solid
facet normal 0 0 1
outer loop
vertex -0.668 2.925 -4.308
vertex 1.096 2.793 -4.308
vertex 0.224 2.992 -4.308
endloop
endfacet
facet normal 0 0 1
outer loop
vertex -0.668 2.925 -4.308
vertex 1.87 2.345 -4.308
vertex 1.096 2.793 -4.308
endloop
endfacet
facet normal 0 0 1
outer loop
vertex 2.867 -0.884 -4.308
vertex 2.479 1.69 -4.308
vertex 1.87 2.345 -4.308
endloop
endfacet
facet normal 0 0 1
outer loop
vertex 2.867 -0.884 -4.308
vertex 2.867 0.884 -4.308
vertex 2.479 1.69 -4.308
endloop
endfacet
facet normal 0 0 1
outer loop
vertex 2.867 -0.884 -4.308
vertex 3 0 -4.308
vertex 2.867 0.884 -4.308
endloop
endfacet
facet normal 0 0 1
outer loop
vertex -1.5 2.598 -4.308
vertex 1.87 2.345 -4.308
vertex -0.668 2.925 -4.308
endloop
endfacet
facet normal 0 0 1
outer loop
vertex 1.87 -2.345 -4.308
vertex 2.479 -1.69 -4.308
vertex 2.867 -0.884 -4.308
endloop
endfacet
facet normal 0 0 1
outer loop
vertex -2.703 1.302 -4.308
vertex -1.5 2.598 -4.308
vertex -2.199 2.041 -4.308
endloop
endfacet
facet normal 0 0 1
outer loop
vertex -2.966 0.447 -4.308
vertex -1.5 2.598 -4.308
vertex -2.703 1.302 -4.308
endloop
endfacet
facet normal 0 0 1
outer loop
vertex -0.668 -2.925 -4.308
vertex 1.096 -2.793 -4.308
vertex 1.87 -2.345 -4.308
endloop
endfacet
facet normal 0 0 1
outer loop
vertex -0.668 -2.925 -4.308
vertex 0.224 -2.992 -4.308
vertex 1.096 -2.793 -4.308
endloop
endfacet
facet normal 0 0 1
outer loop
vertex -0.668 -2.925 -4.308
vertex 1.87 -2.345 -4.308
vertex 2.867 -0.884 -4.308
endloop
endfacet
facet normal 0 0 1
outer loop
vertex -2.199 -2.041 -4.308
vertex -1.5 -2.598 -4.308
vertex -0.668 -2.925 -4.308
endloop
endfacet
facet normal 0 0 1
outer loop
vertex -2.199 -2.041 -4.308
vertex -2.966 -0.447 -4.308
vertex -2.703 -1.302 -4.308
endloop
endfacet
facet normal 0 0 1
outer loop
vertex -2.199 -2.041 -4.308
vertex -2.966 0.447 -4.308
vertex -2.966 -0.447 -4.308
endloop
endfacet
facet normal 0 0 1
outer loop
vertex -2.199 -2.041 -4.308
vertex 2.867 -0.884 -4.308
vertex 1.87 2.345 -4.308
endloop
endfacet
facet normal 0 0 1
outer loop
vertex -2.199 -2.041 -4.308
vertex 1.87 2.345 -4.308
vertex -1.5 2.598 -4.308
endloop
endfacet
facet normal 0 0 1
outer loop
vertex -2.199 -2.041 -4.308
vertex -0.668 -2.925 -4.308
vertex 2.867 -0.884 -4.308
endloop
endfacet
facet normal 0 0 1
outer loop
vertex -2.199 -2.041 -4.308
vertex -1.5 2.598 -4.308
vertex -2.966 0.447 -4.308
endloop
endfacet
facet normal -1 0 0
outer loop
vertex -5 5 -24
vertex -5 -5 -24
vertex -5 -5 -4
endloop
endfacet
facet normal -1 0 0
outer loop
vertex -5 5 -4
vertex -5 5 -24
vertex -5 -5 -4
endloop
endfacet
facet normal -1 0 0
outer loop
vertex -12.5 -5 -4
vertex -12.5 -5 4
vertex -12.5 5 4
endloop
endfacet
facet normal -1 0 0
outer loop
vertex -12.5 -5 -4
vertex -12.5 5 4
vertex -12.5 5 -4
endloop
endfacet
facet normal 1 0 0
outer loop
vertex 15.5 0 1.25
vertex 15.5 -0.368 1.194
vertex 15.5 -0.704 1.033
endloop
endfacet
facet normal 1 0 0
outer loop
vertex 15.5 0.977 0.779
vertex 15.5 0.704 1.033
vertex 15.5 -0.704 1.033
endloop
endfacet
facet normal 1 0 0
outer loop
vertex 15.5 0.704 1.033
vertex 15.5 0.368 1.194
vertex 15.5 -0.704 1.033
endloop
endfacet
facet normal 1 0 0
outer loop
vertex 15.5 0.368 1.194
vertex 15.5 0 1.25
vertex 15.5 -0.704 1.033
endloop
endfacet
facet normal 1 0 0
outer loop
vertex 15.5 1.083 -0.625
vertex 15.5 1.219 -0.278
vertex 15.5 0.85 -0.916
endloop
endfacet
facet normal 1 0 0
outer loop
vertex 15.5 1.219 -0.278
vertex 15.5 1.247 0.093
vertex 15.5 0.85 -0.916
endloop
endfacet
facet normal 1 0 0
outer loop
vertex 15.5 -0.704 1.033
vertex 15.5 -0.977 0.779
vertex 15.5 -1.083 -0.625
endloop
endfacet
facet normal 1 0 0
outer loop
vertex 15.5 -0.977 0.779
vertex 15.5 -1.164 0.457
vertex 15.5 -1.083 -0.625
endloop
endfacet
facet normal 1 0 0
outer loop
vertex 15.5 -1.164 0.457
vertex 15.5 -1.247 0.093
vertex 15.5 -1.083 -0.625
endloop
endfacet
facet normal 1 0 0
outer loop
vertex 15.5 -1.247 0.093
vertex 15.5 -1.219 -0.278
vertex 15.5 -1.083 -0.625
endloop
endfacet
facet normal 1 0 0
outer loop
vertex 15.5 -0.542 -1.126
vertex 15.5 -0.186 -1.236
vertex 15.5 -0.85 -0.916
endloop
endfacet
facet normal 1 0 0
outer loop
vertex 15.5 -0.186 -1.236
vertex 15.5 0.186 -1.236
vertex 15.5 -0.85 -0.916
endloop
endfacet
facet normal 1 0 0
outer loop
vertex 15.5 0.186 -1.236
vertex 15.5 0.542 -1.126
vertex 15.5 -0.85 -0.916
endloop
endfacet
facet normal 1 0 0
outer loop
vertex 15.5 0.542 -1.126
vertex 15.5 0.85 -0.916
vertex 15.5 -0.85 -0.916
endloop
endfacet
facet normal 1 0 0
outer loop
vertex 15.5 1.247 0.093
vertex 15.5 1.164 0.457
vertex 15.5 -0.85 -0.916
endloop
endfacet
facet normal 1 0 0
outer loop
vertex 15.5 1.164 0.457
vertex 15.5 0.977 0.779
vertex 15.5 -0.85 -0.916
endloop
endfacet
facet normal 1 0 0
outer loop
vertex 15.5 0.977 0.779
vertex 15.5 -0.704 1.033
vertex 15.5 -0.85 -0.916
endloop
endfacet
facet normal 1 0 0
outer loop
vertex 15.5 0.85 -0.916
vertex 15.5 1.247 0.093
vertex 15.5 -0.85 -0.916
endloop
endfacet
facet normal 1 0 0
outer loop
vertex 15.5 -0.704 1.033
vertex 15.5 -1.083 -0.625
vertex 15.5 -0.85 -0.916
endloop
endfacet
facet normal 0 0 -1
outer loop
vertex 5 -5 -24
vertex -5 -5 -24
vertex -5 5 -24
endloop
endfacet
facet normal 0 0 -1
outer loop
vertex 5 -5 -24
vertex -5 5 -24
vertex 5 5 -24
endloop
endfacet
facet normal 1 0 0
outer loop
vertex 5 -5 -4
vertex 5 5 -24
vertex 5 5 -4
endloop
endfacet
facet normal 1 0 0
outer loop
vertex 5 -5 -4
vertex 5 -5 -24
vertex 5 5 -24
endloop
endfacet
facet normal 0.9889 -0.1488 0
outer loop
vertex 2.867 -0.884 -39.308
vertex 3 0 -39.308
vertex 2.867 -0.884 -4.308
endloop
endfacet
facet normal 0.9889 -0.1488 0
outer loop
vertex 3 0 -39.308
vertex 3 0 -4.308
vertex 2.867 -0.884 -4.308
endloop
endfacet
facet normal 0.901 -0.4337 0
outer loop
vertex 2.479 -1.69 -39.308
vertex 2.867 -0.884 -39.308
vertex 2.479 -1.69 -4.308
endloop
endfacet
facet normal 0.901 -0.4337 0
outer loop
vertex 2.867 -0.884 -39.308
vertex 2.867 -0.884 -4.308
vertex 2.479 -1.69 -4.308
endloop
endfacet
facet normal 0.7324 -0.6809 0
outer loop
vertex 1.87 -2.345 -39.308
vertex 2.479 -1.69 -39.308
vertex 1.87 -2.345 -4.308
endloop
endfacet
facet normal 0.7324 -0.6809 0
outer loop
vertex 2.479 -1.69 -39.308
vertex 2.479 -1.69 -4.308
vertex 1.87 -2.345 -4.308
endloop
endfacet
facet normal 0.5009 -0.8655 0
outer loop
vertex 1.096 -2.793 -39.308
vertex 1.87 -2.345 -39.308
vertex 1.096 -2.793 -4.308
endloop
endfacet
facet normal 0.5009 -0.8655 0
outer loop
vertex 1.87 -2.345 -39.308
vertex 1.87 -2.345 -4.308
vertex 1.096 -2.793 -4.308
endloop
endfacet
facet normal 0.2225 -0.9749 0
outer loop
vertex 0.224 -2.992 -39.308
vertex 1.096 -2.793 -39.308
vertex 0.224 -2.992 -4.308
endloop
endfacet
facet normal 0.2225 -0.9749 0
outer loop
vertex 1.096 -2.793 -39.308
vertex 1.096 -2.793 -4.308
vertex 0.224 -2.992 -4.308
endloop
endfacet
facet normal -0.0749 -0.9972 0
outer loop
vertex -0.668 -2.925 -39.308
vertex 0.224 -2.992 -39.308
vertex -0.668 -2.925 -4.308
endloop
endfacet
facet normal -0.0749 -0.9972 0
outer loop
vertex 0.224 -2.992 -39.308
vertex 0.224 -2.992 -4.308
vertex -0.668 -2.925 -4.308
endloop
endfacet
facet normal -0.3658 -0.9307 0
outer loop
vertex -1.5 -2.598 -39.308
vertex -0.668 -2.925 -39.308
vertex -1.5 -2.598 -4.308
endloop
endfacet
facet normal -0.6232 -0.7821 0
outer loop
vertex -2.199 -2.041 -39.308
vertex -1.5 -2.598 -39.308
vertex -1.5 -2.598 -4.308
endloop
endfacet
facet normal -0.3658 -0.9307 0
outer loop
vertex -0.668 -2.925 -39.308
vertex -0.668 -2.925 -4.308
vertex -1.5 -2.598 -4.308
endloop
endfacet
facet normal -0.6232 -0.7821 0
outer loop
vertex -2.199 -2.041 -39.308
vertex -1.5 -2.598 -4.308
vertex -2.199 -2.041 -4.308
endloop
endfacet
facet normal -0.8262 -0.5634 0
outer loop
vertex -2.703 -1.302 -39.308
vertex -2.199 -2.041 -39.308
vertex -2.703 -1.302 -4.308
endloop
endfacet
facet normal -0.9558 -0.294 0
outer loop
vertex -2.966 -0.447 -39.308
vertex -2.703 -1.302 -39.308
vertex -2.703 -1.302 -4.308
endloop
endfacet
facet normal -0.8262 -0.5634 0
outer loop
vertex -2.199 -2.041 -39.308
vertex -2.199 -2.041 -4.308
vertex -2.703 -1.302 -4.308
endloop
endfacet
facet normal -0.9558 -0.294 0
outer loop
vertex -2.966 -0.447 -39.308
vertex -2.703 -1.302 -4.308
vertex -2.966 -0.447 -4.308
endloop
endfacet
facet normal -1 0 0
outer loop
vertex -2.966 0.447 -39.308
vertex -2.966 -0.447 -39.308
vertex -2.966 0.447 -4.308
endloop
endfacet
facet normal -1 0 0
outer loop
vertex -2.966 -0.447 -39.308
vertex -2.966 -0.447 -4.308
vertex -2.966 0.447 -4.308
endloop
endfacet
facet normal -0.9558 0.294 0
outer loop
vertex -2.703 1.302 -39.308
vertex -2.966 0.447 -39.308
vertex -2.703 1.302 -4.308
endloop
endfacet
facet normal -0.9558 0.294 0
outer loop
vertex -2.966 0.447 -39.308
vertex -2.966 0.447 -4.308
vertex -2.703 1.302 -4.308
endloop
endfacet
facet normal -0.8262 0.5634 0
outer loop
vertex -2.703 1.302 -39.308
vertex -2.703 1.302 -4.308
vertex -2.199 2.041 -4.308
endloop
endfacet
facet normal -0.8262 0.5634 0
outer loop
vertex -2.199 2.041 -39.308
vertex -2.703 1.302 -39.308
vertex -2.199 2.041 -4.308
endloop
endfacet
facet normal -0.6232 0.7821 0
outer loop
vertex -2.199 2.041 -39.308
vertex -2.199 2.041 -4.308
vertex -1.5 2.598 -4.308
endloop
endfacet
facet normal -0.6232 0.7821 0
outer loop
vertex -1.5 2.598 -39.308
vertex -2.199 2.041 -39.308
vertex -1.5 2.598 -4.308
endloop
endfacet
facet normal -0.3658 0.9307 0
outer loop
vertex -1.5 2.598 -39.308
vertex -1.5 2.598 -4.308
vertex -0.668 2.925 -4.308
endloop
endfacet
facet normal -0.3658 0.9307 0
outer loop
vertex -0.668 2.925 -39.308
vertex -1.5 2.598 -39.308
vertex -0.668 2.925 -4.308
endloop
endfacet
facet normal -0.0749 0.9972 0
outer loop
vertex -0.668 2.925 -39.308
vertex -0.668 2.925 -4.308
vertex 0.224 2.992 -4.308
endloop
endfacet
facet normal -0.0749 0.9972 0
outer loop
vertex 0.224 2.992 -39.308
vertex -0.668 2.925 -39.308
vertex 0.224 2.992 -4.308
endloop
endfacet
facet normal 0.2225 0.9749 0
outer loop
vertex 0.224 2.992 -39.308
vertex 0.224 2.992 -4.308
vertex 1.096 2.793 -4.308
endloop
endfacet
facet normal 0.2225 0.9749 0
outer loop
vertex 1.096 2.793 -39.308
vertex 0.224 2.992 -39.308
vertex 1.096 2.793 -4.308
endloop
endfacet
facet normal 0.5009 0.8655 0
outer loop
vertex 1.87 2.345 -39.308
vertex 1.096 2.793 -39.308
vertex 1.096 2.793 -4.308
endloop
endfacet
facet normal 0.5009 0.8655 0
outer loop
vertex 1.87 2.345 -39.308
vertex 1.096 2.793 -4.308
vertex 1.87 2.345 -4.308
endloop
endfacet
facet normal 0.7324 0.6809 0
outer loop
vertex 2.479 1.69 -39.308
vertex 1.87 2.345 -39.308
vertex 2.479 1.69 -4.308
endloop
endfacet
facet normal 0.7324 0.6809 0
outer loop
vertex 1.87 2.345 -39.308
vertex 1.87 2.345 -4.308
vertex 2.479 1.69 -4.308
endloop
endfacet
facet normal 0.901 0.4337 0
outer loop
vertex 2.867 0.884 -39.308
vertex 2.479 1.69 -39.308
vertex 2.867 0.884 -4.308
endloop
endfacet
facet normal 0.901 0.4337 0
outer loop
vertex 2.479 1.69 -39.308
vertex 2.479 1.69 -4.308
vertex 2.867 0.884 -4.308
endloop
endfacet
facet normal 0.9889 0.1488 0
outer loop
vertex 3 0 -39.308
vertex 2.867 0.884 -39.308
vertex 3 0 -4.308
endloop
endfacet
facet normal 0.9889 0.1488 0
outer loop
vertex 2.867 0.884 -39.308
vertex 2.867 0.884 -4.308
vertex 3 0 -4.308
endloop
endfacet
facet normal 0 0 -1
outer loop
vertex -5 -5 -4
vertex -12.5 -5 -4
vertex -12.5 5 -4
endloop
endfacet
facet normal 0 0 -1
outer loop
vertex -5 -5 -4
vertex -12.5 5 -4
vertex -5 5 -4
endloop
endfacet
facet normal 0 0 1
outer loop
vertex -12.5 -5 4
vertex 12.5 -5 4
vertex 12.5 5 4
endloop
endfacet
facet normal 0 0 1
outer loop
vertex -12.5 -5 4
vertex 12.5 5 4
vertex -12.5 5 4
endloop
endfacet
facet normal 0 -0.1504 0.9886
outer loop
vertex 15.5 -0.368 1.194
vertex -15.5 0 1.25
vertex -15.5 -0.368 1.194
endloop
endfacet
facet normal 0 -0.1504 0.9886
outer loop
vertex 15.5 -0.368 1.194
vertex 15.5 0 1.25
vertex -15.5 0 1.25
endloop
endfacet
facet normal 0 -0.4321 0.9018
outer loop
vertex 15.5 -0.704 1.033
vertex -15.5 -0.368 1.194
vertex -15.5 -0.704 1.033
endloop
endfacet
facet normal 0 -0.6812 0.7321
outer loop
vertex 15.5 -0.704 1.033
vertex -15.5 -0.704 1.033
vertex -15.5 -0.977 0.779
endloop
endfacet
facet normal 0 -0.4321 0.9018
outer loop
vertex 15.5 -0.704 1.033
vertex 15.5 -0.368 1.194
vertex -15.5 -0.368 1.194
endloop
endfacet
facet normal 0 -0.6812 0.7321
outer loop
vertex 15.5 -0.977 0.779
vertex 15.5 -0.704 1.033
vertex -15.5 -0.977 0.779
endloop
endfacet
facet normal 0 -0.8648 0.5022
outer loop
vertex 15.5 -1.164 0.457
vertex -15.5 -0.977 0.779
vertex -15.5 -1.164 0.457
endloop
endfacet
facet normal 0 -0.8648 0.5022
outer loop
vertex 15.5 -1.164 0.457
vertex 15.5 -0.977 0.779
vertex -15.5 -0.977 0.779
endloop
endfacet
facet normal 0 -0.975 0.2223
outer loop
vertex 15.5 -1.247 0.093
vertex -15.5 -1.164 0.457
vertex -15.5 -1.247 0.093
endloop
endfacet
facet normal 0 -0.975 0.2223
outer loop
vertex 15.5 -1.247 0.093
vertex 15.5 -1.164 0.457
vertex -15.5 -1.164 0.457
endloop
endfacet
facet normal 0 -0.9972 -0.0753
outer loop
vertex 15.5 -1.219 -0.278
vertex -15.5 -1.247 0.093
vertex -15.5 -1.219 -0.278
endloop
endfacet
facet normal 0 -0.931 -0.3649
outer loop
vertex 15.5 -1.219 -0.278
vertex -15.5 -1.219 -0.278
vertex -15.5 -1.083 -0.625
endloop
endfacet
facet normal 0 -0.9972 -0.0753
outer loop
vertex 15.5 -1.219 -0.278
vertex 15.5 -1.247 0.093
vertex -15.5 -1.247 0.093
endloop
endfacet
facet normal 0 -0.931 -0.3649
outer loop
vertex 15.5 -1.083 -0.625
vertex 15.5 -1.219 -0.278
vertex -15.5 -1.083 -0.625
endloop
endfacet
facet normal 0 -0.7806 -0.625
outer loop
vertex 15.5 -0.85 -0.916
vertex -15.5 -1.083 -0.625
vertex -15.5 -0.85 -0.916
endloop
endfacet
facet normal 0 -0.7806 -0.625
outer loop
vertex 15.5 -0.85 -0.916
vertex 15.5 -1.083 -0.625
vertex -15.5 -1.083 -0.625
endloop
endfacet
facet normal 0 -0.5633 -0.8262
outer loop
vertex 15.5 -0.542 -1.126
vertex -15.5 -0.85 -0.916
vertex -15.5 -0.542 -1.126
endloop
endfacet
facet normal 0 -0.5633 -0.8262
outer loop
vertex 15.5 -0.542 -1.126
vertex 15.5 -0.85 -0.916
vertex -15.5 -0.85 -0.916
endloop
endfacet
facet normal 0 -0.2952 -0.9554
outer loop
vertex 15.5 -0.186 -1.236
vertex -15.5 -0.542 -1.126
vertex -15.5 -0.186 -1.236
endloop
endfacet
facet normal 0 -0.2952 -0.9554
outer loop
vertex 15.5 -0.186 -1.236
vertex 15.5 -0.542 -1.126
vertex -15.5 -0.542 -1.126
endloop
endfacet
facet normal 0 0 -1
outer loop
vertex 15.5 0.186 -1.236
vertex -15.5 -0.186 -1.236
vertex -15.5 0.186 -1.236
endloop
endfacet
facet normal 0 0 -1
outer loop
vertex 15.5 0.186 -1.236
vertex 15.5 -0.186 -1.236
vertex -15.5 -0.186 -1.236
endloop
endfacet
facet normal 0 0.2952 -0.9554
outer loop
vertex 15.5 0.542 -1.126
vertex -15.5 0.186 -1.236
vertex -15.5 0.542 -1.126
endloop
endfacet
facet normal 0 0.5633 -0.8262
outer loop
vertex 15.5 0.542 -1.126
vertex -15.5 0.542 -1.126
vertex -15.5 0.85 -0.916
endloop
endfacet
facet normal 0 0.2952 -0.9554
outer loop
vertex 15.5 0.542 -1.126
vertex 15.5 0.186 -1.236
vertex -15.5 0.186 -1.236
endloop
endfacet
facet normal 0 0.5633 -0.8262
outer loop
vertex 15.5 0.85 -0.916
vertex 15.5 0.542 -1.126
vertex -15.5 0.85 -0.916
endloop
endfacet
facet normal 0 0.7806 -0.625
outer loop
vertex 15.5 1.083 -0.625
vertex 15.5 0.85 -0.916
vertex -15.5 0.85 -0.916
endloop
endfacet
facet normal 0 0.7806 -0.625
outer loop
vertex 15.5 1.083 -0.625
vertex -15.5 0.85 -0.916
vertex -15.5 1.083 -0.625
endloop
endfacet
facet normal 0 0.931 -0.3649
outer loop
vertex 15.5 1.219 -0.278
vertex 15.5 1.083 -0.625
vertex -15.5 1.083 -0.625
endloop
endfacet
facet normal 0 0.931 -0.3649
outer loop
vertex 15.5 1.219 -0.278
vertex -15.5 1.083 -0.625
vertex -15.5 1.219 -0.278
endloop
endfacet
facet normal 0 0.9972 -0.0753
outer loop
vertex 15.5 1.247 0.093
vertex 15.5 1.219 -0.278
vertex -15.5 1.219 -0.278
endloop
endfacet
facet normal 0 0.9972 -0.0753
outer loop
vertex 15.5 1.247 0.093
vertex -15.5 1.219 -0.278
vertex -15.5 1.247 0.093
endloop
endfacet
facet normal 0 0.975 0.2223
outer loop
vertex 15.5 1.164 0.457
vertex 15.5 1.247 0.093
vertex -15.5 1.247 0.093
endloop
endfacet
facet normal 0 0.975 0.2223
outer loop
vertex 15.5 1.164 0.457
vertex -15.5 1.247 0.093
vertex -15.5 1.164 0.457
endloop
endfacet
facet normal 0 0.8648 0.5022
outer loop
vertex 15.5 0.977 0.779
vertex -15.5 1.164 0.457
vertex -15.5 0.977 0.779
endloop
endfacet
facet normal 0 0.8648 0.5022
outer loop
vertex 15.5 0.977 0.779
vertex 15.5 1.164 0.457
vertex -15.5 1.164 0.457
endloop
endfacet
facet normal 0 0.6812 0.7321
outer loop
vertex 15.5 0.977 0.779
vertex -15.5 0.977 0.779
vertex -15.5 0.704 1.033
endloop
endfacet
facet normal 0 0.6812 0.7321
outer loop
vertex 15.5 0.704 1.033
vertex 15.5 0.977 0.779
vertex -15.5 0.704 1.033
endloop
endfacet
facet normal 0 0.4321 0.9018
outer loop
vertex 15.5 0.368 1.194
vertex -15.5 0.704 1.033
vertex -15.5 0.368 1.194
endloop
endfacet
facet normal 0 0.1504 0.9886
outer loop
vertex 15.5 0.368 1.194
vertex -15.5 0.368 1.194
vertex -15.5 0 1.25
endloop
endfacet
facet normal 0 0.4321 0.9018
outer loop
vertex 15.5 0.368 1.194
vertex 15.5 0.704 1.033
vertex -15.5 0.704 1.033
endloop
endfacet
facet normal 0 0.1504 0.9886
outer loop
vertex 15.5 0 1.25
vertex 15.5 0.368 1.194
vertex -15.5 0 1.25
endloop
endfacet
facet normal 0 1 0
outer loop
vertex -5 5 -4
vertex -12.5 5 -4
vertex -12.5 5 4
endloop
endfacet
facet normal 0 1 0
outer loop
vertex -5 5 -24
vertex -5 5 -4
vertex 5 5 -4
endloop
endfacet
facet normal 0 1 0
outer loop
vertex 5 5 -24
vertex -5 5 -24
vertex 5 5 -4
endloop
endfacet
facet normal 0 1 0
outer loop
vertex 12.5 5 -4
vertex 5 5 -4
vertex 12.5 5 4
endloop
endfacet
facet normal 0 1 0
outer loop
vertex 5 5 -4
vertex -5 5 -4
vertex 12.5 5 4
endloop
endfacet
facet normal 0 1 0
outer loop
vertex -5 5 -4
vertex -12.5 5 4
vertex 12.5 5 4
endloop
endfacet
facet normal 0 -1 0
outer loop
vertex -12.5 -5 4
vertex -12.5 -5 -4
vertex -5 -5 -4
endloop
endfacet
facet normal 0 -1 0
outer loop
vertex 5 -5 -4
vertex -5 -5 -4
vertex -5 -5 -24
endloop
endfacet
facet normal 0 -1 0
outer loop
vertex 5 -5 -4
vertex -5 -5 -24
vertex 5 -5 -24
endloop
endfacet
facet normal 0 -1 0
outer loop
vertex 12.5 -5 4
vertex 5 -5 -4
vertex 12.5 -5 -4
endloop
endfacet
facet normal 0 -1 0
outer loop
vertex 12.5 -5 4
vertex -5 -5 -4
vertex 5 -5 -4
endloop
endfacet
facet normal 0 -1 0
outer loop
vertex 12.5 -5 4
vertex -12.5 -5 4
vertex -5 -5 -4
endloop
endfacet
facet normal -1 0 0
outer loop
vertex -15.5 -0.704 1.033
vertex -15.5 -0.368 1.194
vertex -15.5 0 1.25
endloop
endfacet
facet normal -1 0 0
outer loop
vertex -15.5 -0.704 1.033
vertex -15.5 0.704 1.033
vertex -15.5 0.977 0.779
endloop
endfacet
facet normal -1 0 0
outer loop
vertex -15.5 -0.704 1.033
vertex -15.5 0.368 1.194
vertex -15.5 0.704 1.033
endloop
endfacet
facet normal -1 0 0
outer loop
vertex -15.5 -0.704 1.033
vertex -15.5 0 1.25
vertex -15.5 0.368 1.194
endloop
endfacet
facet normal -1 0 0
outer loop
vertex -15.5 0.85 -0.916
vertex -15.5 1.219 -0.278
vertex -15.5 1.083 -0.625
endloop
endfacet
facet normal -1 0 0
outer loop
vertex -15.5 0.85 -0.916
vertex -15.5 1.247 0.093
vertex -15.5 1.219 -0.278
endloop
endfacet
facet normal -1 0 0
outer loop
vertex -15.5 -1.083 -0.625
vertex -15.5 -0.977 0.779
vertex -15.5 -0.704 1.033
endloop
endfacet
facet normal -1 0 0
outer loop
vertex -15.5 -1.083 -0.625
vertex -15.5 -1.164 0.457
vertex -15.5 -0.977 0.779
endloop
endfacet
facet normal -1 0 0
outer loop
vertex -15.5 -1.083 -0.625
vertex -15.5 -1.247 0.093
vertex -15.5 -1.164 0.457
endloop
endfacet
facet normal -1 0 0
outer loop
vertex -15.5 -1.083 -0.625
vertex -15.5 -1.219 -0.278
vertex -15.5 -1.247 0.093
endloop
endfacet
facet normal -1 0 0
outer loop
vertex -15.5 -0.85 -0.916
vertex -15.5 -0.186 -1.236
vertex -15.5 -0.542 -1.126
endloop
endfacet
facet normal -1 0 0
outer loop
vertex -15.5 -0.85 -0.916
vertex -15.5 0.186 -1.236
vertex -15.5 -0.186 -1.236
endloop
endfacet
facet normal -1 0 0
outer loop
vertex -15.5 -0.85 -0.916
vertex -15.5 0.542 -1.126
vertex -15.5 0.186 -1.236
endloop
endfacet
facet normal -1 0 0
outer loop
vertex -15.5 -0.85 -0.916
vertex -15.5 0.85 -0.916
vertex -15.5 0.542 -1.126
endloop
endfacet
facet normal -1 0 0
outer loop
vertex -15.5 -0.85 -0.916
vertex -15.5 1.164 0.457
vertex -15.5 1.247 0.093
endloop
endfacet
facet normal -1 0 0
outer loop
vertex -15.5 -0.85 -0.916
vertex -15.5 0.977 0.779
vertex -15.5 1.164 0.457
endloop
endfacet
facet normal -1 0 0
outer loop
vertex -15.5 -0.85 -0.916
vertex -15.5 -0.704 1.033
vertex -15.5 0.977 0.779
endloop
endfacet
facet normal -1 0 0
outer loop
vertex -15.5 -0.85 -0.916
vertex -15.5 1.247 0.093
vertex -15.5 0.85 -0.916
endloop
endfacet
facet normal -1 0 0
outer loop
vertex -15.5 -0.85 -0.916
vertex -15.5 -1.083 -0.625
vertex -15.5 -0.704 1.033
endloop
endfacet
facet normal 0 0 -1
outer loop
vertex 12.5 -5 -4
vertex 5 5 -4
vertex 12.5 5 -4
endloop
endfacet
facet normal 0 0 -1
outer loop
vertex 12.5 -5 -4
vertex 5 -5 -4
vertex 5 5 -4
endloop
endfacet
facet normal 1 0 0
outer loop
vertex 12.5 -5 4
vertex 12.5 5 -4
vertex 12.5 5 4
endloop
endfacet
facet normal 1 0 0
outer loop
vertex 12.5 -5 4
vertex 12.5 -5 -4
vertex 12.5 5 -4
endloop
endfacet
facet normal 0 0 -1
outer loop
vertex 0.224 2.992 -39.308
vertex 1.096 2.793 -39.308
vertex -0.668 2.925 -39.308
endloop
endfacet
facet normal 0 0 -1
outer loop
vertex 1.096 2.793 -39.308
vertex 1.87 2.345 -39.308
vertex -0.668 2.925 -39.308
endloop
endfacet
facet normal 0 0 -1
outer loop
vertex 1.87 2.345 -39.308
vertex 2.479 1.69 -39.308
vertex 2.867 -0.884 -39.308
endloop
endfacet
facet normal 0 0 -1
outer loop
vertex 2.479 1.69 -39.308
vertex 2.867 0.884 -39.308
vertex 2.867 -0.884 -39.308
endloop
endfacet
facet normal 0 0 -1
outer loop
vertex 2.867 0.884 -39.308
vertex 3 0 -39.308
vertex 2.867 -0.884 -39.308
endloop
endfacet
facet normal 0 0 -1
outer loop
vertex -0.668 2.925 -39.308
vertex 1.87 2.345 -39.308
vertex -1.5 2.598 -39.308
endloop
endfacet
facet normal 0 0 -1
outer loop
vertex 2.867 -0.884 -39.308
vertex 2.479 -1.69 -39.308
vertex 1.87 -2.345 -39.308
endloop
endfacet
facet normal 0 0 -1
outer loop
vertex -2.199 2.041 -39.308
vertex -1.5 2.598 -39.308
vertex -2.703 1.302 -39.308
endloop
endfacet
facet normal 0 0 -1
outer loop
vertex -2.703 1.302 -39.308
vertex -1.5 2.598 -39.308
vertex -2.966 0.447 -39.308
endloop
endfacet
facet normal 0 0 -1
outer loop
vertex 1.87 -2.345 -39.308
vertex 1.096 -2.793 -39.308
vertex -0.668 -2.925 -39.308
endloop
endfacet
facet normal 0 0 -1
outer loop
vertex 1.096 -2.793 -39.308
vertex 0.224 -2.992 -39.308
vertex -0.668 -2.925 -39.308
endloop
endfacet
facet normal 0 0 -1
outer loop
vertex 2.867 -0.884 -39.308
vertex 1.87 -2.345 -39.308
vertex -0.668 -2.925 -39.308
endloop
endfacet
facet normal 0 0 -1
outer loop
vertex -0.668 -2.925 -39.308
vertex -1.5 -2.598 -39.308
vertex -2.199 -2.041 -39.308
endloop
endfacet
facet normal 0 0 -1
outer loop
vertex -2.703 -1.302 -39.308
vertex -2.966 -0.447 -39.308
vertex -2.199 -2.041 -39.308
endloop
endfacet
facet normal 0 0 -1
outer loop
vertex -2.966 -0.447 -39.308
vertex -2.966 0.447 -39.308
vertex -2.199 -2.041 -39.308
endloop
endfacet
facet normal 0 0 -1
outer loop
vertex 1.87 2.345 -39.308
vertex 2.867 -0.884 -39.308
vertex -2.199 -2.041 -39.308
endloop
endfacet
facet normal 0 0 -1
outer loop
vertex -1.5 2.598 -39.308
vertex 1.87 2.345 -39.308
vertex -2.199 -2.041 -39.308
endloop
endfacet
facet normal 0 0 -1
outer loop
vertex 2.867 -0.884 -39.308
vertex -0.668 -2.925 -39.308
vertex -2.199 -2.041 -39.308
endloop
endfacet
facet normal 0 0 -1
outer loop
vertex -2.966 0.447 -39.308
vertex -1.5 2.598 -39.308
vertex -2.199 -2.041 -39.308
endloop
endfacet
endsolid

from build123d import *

# Parameters (mm, degrees)
F0_W     = 3
F0_H     = 35
F2_W     = 31
F2_H     = 1.25
F4_W     = 10
F4_H     = 20
F5_DEPTH = 5


with BuildPart() as f1:
    # F0 (on Front) → F1 (revolve)
    with BuildSketch(Plane.XZ):
        with Locations((1.5, -21.807702)):
            Rectangle(F0_W, F0_H)
    revolve(axis=Axis((0, 0, -11.000003), (0, 0, -1)))


with BuildPart() as f3:
    # F2 (on Front) → F3 (revolve)
    with BuildSketch(Plane.XZ):
        with Locations((0, 0.625)):
            Rectangle(F2_W, F2_H)
    revolve(axis=Axis((-2.146152, 0, 0), (1, 0, 0)))


with BuildPart() as f5:
    # F4 (on Front) → F5 (new body, symmetric)
    with BuildSketch(Plane.XZ):
        Polygon((12.5, -4), (12.5, 4), (-12.5, 4), (-12.5, -4), (-5, -4), (5, -4), align=None)
        with Locations((0, -14)):
            Rectangle(F4_W, F4_H)
    extrude(amount=F5_DEPTH, both=True)


solid = Compound([f1.part, f3.part, f5.part])
